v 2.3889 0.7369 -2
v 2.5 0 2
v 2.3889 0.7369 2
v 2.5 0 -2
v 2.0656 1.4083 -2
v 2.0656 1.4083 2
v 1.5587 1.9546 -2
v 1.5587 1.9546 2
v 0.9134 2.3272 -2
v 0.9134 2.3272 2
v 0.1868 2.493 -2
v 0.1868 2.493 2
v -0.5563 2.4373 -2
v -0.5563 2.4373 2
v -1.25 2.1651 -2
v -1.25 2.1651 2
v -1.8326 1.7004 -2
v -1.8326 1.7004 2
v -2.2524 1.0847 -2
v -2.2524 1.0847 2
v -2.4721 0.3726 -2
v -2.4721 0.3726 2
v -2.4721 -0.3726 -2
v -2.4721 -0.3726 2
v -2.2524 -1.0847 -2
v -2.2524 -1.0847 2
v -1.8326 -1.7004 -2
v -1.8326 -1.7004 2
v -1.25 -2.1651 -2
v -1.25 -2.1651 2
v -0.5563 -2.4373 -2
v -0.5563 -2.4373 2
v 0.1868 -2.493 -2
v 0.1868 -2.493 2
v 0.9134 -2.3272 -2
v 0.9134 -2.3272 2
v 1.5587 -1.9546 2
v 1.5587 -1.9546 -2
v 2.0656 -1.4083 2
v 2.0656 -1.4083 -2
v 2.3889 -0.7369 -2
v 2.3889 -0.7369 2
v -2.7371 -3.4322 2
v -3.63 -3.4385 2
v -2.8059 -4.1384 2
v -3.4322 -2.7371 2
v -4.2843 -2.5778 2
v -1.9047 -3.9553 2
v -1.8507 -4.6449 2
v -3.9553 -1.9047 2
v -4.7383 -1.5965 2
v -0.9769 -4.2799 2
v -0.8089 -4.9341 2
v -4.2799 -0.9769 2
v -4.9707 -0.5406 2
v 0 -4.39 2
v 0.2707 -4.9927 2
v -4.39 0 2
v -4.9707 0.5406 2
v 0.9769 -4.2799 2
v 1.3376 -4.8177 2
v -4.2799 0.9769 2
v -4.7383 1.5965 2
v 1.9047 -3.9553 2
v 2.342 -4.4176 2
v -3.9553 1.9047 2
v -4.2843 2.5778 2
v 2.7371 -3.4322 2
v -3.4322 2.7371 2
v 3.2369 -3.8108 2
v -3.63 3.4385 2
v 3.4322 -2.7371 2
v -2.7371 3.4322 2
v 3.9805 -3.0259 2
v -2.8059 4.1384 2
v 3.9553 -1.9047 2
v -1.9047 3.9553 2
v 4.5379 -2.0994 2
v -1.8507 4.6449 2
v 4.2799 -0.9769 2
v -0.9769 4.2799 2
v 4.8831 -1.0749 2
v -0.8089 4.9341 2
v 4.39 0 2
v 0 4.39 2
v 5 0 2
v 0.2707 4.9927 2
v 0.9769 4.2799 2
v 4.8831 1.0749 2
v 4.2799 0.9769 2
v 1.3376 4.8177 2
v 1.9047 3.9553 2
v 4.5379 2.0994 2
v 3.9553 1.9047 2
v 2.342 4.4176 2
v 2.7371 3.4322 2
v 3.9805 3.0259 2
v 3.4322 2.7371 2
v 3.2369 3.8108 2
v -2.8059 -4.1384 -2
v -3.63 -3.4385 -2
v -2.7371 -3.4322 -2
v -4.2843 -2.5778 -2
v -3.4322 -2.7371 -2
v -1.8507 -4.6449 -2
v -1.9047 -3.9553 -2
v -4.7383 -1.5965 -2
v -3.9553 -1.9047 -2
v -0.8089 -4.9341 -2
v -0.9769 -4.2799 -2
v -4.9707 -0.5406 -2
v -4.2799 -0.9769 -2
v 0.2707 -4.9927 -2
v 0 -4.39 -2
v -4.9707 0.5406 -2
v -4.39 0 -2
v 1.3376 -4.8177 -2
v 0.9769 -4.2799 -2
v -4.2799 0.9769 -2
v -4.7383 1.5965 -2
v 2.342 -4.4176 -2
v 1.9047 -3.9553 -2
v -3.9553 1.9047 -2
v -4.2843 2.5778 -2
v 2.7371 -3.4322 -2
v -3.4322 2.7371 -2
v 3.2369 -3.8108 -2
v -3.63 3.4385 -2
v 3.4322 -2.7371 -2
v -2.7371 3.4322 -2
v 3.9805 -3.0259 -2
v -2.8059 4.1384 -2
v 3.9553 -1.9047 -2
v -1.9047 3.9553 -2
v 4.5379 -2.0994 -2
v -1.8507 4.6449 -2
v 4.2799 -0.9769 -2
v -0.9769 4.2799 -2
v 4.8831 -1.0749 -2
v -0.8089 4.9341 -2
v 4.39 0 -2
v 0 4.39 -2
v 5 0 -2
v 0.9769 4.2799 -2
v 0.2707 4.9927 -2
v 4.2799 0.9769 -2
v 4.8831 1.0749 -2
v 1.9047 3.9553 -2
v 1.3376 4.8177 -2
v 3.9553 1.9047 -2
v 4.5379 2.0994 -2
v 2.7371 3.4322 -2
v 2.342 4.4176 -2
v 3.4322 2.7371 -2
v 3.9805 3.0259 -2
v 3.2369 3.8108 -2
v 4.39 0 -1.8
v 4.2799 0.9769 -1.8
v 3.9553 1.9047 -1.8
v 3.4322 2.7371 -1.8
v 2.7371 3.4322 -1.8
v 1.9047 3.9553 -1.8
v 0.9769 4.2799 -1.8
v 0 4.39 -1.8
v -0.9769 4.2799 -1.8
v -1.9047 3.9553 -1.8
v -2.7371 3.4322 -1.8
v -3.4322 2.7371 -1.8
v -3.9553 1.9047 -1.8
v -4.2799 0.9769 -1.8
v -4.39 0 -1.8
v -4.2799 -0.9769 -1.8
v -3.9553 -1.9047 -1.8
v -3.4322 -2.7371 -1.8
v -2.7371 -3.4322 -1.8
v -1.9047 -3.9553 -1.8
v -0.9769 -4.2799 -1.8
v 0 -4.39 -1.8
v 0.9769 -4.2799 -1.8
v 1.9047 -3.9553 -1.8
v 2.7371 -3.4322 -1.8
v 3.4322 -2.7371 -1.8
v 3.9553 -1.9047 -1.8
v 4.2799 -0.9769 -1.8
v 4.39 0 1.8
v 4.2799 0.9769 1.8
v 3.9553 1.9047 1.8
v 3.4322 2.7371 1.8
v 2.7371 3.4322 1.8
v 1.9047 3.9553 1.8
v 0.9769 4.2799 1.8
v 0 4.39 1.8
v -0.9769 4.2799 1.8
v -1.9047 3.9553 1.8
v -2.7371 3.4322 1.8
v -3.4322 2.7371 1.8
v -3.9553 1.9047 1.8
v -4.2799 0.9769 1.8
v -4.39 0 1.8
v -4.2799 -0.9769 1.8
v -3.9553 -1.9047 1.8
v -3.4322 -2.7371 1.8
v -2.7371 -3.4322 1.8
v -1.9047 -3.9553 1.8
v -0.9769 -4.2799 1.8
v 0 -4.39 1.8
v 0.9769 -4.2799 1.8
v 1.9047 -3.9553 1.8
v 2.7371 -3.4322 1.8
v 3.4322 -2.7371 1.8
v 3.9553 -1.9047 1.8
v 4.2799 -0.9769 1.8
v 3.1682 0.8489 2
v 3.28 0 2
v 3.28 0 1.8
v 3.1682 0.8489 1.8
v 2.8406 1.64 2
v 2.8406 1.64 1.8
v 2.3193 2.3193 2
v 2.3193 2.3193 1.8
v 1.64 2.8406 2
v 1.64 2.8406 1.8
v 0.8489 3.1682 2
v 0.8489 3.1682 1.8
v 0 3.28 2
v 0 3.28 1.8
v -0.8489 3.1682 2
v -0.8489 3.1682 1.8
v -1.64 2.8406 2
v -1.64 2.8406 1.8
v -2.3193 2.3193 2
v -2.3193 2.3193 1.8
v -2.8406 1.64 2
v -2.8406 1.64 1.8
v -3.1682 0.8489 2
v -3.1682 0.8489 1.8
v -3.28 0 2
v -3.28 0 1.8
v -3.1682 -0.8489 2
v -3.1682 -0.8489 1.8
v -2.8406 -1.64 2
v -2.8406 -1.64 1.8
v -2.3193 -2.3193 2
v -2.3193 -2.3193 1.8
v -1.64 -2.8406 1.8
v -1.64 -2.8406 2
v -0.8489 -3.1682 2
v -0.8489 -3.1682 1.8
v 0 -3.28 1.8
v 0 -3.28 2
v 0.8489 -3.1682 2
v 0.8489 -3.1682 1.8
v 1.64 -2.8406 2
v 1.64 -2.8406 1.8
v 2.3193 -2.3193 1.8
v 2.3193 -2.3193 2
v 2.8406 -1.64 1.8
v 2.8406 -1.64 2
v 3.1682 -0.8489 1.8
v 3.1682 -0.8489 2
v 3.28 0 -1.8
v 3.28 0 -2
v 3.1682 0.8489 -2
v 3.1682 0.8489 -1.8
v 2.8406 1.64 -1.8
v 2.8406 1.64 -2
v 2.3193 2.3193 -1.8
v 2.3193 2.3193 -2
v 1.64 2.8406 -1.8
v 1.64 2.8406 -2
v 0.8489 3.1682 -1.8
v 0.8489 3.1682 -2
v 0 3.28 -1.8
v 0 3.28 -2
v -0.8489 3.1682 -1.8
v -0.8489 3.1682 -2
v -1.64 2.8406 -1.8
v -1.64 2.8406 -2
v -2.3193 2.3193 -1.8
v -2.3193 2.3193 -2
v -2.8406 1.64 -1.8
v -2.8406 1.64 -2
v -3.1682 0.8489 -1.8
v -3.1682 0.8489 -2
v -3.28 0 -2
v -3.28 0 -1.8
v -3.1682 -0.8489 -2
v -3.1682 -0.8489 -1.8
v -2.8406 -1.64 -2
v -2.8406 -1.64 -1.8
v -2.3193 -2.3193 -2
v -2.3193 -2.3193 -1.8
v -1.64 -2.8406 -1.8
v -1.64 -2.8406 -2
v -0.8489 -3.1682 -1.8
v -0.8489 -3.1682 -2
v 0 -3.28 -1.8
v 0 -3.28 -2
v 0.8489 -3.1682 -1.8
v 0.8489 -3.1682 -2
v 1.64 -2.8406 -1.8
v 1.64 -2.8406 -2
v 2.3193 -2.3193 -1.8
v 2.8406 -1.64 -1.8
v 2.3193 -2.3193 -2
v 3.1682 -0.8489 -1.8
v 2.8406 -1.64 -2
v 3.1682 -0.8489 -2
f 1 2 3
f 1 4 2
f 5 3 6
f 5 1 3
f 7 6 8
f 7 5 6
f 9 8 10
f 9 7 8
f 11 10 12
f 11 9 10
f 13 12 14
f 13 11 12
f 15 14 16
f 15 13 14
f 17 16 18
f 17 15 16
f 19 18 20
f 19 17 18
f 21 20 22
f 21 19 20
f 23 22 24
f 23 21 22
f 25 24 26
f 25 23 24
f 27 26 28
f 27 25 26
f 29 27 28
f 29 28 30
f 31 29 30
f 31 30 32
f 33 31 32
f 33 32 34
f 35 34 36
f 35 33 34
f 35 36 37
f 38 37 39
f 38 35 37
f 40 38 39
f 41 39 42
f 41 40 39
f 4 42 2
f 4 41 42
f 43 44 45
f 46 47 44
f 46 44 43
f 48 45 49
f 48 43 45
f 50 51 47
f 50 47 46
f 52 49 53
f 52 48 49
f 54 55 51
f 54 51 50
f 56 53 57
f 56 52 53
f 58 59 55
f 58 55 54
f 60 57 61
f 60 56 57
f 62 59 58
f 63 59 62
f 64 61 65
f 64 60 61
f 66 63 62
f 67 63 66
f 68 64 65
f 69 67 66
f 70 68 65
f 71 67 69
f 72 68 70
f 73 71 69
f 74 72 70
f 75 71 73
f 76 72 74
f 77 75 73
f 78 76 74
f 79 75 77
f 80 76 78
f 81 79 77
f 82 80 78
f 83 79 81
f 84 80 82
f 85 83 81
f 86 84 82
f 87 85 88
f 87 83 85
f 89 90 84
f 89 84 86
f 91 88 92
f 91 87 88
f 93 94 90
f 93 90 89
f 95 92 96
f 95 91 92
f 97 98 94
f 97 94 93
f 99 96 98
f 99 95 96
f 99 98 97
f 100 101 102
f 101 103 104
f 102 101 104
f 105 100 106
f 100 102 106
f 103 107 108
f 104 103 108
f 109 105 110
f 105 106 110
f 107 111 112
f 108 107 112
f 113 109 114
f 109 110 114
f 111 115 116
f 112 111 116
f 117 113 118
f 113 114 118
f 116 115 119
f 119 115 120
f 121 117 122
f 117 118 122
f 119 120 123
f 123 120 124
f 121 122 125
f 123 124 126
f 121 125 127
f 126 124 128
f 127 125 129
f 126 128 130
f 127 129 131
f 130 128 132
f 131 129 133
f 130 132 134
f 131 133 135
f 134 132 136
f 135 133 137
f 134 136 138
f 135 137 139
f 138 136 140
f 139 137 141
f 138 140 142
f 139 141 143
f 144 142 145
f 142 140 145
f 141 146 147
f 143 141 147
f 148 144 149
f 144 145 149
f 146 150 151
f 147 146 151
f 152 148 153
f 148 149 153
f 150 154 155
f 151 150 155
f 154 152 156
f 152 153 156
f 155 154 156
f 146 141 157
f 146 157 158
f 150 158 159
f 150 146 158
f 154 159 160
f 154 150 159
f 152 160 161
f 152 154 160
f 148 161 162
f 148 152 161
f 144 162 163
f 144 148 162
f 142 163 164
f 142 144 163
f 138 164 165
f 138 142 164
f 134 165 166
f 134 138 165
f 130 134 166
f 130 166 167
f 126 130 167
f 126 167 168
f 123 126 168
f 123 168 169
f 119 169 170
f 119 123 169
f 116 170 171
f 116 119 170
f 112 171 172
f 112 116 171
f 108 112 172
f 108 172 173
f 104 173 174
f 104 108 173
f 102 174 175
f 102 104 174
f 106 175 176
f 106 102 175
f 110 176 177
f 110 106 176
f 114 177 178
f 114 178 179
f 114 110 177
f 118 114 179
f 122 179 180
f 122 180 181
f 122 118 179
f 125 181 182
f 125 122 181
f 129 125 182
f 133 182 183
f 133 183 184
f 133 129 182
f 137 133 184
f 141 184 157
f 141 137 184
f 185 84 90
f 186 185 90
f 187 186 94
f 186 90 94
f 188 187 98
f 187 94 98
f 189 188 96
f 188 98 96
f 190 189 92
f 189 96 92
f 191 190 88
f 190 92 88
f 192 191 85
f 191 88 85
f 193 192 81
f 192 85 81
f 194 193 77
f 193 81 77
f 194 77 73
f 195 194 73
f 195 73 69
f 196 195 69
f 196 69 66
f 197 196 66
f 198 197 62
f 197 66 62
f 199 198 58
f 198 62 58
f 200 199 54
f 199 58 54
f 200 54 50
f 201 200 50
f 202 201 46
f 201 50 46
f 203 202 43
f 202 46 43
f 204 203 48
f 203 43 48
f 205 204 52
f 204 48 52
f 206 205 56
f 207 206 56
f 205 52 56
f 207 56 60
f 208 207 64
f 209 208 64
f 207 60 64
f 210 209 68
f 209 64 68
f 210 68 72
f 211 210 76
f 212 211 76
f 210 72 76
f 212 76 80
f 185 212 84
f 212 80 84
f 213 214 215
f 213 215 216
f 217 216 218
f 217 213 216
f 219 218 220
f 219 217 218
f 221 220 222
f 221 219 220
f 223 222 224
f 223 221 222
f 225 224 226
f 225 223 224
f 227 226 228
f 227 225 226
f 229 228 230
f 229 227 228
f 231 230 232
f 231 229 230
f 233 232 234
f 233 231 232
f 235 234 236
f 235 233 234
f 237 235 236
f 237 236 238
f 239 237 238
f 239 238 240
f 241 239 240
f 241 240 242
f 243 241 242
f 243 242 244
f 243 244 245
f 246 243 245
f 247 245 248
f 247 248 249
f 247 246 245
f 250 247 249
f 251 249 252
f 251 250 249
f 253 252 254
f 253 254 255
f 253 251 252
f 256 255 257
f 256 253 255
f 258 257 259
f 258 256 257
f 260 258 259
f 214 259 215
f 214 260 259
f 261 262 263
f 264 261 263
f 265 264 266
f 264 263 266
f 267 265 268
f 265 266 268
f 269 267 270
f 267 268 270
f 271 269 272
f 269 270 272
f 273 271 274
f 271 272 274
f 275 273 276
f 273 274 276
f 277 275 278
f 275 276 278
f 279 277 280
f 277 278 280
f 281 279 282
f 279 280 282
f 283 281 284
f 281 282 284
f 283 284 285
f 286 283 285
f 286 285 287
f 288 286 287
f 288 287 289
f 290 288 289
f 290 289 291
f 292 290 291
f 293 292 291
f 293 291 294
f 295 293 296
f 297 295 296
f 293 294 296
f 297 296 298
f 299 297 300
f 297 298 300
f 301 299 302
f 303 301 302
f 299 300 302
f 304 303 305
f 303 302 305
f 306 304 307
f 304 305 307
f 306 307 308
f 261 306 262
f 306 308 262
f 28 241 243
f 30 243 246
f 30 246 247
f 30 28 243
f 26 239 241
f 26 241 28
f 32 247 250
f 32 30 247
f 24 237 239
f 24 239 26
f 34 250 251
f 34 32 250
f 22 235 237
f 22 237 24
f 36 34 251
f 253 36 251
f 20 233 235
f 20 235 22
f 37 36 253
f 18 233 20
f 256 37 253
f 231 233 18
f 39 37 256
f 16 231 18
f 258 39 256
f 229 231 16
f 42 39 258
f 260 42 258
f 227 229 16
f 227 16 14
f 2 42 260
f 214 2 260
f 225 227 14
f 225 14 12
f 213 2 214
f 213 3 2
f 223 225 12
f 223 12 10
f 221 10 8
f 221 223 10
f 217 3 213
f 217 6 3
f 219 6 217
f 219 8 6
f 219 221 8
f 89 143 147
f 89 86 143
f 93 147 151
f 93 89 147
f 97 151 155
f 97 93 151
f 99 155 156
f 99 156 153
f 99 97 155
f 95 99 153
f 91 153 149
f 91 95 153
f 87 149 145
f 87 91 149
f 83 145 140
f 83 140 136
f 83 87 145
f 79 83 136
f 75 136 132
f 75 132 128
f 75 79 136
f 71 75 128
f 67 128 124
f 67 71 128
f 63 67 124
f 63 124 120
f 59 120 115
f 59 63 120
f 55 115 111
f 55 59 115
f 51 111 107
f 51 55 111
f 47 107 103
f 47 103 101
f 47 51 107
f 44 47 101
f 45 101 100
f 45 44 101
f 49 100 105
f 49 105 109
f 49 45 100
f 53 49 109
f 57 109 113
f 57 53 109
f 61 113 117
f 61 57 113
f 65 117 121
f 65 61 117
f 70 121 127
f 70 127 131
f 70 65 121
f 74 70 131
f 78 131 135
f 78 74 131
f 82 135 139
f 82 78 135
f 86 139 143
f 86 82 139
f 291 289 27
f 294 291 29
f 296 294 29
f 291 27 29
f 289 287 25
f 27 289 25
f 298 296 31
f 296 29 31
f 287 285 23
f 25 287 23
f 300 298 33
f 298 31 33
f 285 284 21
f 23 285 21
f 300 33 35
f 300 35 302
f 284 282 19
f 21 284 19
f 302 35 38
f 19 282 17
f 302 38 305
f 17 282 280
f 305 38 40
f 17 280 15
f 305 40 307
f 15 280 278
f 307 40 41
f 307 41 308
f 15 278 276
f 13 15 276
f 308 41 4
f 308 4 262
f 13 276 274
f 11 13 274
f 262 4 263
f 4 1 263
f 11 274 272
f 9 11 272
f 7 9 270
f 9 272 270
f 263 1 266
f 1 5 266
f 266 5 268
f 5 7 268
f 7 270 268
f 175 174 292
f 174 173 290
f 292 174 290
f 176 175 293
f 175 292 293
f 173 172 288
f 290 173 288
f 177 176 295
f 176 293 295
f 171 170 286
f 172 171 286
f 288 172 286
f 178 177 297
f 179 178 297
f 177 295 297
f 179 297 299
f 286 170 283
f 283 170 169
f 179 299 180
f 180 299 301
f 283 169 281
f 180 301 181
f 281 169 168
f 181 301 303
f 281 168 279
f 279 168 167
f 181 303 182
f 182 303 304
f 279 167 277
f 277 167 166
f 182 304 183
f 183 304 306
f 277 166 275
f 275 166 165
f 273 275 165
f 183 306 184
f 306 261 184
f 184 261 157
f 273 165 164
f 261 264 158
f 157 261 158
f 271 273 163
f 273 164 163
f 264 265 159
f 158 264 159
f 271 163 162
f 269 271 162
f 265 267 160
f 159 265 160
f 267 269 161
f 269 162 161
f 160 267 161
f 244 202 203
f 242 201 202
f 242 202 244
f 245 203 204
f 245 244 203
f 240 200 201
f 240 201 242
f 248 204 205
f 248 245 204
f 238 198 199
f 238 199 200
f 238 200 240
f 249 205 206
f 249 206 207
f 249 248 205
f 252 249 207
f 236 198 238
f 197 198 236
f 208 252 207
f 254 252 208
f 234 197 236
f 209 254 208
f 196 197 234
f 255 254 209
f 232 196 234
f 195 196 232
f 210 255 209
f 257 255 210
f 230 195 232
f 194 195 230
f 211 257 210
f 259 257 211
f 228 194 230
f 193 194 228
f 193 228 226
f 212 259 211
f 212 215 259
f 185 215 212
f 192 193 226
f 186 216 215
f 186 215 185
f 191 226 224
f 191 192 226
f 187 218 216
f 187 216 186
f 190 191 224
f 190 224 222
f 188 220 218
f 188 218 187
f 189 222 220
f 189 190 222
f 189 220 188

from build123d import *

# Parameters (mm, degrees)
SKETCH1_R           = 5
SKETCH1_R_2         = 2.5
BOSS_EXTRUDE1_DEPTH = 2
SKETCH2_R           = 4.39
SKETCH2_R_2         = 3.28
CUT_EXTRUDE1_DEPTH  = 0.2


with BuildPart() as part:
    # Sketch1 → Boss-Extrude1 (new body, symmetric)
    with BuildSketch(Plane.XY):
        Circle(SKETCH1_R)
        Circle(SKETCH1_R_2, mode=Mode.SUBTRACT)
    extrude(amount=BOSS_EXTRUDE1_DEPTH, both=True)

    # Sketch2 → Cut-Extrude1 (cut)
    with BuildSketch(Plane.XY.offset(2)):
        Circle(SKETCH2_R)
        Circle(SKETCH2_R_2, mode=Mode.SUBTRACT)
    cut_extrude1 = extrude(amount=-CUT_EXTRUDE1_DEPTH, mode=Mode.SUBTRACT)

    # Mirror1: Cut-Extrude1 across plane
    add(cut_extrude1.mirror(Plane.XY), mode=Mode.SUBTRACT)


solid = part.part
